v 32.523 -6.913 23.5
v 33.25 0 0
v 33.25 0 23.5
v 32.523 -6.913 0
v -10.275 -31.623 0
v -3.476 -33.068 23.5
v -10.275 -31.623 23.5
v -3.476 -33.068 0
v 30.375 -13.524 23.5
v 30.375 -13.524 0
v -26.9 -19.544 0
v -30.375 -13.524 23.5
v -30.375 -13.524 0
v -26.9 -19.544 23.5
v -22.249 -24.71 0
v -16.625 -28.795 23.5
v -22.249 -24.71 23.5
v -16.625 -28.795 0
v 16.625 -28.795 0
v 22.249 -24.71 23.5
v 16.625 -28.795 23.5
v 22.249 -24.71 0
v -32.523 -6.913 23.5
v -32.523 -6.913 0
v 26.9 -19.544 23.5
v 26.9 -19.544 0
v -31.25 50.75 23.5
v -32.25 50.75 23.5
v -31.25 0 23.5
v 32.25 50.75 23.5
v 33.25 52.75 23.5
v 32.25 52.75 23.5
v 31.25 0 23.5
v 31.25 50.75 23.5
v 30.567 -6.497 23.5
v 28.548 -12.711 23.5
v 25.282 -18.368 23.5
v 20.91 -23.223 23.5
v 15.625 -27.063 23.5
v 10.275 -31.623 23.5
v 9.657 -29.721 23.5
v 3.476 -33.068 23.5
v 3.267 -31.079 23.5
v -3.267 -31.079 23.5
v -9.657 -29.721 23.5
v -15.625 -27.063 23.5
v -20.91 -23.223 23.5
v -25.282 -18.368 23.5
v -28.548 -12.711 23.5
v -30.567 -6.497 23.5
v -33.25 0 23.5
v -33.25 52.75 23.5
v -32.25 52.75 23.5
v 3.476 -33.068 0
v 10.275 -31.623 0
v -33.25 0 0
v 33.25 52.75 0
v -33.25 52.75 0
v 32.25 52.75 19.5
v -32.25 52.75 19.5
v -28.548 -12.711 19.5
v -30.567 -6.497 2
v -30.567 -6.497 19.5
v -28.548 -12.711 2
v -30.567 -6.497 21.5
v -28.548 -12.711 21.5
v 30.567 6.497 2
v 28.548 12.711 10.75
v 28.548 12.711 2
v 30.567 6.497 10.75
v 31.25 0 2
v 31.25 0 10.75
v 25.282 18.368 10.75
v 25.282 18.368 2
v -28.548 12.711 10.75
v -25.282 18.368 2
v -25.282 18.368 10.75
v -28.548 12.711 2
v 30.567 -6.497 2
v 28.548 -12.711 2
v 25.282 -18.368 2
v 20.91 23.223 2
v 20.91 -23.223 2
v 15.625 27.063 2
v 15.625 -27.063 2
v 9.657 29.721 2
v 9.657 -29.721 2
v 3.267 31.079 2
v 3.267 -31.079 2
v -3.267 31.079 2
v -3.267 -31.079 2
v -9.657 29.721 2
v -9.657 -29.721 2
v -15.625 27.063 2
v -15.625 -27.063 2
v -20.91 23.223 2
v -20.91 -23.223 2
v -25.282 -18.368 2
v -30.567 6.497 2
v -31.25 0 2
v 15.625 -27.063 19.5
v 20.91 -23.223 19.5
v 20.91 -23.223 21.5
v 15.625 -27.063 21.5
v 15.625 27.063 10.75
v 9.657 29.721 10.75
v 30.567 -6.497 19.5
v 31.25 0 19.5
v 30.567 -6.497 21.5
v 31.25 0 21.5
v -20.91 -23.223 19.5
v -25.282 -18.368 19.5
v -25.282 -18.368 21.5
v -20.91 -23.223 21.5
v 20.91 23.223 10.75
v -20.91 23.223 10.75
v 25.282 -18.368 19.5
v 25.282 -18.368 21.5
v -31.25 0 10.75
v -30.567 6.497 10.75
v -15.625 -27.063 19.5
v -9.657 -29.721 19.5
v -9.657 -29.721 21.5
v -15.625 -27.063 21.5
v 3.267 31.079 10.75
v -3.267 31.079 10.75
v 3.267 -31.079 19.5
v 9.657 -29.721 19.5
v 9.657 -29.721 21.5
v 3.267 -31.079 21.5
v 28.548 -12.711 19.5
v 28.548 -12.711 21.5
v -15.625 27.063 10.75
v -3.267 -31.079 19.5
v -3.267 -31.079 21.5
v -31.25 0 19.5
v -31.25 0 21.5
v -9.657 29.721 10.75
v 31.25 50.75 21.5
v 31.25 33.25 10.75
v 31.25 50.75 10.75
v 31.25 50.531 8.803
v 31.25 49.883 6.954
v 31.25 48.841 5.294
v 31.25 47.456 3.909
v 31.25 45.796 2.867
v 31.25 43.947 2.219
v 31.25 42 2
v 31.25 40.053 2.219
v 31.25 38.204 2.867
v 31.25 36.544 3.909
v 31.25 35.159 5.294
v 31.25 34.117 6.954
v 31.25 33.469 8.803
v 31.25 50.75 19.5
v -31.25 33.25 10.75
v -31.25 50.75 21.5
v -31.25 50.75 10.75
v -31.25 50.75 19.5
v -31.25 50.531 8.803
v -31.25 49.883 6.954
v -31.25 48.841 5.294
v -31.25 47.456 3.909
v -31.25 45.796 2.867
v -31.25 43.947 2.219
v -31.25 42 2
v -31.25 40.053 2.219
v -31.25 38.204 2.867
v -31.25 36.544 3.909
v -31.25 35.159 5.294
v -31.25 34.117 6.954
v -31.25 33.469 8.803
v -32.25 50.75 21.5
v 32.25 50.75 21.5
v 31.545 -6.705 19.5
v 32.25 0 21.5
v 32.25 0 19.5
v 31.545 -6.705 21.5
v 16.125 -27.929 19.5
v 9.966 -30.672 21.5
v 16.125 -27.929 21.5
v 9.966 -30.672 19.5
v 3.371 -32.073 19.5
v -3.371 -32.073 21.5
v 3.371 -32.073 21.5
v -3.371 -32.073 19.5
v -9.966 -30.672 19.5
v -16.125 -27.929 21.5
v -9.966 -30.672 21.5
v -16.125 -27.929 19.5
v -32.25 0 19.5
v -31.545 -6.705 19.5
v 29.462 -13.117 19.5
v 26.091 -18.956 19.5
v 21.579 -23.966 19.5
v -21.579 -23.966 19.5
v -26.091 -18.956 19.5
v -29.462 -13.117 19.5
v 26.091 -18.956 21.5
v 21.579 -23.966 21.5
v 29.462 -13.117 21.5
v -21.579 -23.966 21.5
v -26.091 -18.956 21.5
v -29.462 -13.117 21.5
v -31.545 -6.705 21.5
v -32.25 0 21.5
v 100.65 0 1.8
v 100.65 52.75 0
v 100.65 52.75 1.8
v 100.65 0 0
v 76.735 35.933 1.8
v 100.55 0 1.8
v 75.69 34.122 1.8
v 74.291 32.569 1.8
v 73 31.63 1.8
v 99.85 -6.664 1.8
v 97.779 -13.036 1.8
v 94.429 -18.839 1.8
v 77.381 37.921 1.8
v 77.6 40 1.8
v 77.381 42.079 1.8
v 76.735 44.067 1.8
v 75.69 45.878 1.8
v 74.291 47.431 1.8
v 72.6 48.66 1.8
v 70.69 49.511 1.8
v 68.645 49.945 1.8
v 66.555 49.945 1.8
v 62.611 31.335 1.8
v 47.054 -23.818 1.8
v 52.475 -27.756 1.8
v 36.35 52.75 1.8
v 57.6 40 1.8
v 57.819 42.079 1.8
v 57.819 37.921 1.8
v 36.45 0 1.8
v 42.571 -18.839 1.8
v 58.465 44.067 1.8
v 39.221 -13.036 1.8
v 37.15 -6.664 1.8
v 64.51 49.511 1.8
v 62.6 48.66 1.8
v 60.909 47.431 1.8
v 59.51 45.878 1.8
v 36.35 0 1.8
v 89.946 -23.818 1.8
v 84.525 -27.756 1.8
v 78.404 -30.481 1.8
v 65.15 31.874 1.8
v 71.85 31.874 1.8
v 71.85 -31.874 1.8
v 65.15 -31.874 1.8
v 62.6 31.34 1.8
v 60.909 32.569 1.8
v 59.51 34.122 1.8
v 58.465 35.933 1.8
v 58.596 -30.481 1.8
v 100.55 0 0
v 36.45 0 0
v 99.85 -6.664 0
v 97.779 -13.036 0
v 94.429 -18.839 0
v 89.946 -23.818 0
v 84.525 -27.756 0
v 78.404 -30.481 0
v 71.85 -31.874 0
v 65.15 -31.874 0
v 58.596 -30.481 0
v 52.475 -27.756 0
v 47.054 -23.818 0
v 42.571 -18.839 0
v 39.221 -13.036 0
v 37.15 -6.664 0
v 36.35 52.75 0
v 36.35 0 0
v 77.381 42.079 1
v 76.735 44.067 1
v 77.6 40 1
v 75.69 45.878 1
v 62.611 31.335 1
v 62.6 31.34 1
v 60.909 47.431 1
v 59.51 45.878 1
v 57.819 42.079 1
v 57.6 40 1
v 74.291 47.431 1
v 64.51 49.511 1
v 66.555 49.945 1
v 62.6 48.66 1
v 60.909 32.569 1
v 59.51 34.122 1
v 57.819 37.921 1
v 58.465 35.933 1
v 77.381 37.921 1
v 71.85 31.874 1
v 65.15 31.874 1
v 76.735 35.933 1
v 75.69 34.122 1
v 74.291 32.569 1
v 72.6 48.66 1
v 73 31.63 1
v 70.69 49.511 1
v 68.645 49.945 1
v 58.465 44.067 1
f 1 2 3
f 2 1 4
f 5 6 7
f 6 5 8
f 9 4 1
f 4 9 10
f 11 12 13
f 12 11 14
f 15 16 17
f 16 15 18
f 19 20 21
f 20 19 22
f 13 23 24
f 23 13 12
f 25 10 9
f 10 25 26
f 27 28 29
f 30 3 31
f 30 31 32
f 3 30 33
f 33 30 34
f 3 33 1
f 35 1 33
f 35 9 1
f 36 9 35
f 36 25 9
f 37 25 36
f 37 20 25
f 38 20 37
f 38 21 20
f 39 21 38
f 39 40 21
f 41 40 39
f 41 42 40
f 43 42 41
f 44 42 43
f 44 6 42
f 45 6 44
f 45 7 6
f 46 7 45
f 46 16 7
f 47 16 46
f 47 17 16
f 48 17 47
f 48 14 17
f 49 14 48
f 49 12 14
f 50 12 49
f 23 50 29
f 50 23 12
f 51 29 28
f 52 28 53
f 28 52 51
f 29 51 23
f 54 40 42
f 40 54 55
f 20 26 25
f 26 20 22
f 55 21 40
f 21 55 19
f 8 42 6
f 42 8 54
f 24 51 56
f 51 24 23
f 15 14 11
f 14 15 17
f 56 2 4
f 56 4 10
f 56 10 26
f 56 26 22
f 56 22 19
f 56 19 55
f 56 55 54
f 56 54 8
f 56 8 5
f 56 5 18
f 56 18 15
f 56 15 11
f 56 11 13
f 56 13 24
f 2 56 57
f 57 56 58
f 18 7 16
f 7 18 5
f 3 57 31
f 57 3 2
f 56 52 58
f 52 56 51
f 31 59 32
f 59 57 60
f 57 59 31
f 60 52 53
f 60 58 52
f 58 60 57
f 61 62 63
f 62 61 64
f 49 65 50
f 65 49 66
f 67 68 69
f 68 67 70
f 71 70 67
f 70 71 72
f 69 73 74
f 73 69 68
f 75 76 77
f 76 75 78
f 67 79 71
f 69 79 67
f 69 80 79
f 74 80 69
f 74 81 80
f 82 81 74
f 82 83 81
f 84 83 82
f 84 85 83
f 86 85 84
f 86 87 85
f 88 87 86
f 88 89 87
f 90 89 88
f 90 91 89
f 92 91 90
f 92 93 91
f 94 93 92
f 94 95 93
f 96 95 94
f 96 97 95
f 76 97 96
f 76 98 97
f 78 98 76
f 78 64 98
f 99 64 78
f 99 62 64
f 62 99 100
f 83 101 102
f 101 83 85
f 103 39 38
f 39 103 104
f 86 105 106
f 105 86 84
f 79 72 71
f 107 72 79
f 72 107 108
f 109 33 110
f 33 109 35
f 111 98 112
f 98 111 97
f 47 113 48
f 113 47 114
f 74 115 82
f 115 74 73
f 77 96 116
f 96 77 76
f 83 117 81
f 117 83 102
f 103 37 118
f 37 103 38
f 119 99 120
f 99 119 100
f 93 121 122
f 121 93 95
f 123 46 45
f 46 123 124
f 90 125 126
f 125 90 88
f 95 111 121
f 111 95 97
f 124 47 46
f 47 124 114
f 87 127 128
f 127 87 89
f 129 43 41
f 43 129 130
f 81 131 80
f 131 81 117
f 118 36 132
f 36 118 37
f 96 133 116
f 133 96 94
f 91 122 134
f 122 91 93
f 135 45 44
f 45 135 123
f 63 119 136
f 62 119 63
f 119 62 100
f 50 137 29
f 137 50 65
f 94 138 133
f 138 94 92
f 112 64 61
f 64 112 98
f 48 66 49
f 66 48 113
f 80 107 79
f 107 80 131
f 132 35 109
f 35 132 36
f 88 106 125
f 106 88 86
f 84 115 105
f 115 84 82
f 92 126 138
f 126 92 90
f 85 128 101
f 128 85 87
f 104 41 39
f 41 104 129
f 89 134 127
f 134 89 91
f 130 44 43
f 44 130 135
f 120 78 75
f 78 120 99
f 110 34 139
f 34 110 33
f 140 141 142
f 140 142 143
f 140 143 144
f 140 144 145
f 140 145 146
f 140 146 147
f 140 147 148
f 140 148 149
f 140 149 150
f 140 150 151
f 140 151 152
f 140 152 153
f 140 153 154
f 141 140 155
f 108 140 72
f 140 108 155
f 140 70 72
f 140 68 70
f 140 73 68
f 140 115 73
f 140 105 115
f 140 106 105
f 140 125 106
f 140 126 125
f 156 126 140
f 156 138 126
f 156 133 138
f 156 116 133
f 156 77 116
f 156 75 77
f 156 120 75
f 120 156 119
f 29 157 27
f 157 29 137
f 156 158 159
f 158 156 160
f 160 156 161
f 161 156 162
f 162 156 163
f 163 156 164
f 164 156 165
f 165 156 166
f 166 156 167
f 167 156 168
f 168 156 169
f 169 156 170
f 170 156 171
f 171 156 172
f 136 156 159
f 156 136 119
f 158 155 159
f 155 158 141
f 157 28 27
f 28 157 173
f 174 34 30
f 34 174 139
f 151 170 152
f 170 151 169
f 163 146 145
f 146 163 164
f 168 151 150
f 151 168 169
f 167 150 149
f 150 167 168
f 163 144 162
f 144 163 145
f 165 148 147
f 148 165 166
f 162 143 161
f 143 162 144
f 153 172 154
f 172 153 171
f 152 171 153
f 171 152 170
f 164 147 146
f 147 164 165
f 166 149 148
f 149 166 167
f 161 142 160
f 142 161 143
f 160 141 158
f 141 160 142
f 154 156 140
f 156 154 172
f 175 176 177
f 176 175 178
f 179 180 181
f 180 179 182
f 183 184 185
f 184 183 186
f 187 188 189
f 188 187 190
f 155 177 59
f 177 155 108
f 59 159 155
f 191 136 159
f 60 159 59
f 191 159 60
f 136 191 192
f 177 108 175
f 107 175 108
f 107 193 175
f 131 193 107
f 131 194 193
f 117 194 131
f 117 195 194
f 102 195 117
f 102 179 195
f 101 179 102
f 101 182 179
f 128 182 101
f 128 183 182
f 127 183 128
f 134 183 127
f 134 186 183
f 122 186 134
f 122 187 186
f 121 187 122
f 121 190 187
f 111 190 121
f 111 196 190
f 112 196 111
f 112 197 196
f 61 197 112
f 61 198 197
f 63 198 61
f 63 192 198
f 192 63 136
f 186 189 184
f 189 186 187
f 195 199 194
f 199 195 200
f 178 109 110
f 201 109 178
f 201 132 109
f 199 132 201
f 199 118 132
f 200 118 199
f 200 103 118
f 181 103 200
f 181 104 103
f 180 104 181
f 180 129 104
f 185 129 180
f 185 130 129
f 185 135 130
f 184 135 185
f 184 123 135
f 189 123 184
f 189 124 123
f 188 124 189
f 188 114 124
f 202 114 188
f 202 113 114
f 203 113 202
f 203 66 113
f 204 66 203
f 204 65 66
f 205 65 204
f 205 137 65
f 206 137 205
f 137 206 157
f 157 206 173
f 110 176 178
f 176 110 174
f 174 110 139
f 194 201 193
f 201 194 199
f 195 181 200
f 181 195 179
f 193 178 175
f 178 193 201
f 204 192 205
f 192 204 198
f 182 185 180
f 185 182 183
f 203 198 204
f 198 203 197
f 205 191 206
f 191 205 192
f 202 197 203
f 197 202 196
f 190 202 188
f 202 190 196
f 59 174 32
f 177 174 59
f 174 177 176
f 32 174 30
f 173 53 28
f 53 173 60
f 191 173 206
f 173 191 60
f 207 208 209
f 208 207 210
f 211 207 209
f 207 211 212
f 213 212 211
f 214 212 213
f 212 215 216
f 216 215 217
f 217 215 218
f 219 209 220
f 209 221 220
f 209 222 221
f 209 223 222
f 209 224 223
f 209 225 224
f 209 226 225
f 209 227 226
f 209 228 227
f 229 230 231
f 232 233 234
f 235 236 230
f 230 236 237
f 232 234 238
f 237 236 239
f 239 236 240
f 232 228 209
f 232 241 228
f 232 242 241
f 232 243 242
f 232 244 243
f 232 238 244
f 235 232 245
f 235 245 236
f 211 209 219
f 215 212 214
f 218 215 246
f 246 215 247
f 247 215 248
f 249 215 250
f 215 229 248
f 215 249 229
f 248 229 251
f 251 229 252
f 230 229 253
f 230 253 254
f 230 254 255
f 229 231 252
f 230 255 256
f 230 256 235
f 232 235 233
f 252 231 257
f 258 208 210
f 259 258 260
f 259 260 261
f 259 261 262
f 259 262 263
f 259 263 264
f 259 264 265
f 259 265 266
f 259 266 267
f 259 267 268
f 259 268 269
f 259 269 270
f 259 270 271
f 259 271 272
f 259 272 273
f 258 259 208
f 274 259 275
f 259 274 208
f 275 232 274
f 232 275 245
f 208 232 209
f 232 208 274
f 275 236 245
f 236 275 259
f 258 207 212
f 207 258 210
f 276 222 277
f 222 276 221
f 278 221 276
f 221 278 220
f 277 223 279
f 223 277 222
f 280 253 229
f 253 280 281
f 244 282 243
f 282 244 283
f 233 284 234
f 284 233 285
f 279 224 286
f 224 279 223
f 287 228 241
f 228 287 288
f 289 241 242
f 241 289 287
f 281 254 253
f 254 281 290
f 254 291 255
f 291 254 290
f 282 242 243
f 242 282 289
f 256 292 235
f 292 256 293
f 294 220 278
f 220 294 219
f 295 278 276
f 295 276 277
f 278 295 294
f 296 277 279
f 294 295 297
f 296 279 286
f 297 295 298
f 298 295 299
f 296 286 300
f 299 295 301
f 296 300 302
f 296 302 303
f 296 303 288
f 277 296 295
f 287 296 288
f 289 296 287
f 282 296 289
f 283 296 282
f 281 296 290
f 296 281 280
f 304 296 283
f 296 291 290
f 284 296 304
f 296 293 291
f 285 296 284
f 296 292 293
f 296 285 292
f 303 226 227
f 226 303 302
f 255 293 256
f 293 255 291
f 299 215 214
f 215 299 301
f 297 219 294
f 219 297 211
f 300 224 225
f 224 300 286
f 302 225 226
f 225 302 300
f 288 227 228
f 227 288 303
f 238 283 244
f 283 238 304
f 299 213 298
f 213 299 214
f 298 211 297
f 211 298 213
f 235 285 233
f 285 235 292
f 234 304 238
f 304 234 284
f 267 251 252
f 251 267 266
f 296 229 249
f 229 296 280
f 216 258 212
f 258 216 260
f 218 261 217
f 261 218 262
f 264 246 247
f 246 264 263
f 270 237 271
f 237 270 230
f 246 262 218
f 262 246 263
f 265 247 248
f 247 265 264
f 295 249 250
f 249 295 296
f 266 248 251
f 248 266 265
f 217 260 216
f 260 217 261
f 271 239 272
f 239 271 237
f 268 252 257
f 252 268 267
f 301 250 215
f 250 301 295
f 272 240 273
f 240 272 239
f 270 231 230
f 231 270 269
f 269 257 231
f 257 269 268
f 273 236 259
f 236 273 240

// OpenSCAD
ink_pad = 62.5;
hanko_lenght = 60.5;
hanko_width = 17.5;
wall = 2;


difference(){
    
    // Shell
    union(){
        cylinder(hanko_width+wall*3, ink_pad/2+wall, ink_pad/2+wall);
        translate([-ink_pad/2-wall,0,0])
        cube([ink_pad+wall*2, ink_pad/2+wall+hanko_width+wall, hanko_width+wall*3]);
    }
    
    // Ink pad space
    translate([0,0,wall])
    cylinder(hanko_width+wall*3, ink_pad/2, ink_pad/2);
    translate([-ink_pad/2,0,wall+hanko_width/2])
    cube([ink_pad, ink_pad/2+wall+hanko_width, hanko_width+wall]);
    
    
    // Hanko space
    translate([0,ink_pad/2+wall+hanko_width/2,wall+hanko_width/2])
    rotate([0,90,0])
    cylinder(ink_pad, hanko_width/2, hanko_width/2, center=true);
    
    // Cover space
    translate([0,0,wall+hanko_width])
    cylinder(wall, ink_pad/2+wall/2, ink_pad/2+wall/2);
    
    translate([-ink_pad/2-wall/2,0,wall+hanko_width])
    cube([ink_pad+wall, ink_pad/2+wall+hanko_width, wall]);
    
    #translate([-ink_pad/2-wall/2,ink_pad/2+wall+hanko_width,wall+hanko_width])
    cube([ink_pad+wall, wall, wall*2]);
    
    
    
}

translate([ink_pad+wall*3,0,-wall-hanko_width]){

    translate([0,0,wall+hanko_width])
    cylinder(wall-0.2, ink_pad/2+wall/2-0.2, ink_pad/2+wall/2-0.2);
    
    difference(){
    translate([-ink_pad/2-wall/2+0.1,0,wall+hanko_width])
    cube([ink_pad+wall-0.2, ink_pad/2+wall+hanko_width+wall, wall-0.2]);
    
        #translate([-ink_pad/2-wall/2+0.1+ink_pad/2,ink_pad/2+hanko_width/2,wall+hanko_width+wall/2])
        cylinder(10,10,10);
    
    }
    
}
